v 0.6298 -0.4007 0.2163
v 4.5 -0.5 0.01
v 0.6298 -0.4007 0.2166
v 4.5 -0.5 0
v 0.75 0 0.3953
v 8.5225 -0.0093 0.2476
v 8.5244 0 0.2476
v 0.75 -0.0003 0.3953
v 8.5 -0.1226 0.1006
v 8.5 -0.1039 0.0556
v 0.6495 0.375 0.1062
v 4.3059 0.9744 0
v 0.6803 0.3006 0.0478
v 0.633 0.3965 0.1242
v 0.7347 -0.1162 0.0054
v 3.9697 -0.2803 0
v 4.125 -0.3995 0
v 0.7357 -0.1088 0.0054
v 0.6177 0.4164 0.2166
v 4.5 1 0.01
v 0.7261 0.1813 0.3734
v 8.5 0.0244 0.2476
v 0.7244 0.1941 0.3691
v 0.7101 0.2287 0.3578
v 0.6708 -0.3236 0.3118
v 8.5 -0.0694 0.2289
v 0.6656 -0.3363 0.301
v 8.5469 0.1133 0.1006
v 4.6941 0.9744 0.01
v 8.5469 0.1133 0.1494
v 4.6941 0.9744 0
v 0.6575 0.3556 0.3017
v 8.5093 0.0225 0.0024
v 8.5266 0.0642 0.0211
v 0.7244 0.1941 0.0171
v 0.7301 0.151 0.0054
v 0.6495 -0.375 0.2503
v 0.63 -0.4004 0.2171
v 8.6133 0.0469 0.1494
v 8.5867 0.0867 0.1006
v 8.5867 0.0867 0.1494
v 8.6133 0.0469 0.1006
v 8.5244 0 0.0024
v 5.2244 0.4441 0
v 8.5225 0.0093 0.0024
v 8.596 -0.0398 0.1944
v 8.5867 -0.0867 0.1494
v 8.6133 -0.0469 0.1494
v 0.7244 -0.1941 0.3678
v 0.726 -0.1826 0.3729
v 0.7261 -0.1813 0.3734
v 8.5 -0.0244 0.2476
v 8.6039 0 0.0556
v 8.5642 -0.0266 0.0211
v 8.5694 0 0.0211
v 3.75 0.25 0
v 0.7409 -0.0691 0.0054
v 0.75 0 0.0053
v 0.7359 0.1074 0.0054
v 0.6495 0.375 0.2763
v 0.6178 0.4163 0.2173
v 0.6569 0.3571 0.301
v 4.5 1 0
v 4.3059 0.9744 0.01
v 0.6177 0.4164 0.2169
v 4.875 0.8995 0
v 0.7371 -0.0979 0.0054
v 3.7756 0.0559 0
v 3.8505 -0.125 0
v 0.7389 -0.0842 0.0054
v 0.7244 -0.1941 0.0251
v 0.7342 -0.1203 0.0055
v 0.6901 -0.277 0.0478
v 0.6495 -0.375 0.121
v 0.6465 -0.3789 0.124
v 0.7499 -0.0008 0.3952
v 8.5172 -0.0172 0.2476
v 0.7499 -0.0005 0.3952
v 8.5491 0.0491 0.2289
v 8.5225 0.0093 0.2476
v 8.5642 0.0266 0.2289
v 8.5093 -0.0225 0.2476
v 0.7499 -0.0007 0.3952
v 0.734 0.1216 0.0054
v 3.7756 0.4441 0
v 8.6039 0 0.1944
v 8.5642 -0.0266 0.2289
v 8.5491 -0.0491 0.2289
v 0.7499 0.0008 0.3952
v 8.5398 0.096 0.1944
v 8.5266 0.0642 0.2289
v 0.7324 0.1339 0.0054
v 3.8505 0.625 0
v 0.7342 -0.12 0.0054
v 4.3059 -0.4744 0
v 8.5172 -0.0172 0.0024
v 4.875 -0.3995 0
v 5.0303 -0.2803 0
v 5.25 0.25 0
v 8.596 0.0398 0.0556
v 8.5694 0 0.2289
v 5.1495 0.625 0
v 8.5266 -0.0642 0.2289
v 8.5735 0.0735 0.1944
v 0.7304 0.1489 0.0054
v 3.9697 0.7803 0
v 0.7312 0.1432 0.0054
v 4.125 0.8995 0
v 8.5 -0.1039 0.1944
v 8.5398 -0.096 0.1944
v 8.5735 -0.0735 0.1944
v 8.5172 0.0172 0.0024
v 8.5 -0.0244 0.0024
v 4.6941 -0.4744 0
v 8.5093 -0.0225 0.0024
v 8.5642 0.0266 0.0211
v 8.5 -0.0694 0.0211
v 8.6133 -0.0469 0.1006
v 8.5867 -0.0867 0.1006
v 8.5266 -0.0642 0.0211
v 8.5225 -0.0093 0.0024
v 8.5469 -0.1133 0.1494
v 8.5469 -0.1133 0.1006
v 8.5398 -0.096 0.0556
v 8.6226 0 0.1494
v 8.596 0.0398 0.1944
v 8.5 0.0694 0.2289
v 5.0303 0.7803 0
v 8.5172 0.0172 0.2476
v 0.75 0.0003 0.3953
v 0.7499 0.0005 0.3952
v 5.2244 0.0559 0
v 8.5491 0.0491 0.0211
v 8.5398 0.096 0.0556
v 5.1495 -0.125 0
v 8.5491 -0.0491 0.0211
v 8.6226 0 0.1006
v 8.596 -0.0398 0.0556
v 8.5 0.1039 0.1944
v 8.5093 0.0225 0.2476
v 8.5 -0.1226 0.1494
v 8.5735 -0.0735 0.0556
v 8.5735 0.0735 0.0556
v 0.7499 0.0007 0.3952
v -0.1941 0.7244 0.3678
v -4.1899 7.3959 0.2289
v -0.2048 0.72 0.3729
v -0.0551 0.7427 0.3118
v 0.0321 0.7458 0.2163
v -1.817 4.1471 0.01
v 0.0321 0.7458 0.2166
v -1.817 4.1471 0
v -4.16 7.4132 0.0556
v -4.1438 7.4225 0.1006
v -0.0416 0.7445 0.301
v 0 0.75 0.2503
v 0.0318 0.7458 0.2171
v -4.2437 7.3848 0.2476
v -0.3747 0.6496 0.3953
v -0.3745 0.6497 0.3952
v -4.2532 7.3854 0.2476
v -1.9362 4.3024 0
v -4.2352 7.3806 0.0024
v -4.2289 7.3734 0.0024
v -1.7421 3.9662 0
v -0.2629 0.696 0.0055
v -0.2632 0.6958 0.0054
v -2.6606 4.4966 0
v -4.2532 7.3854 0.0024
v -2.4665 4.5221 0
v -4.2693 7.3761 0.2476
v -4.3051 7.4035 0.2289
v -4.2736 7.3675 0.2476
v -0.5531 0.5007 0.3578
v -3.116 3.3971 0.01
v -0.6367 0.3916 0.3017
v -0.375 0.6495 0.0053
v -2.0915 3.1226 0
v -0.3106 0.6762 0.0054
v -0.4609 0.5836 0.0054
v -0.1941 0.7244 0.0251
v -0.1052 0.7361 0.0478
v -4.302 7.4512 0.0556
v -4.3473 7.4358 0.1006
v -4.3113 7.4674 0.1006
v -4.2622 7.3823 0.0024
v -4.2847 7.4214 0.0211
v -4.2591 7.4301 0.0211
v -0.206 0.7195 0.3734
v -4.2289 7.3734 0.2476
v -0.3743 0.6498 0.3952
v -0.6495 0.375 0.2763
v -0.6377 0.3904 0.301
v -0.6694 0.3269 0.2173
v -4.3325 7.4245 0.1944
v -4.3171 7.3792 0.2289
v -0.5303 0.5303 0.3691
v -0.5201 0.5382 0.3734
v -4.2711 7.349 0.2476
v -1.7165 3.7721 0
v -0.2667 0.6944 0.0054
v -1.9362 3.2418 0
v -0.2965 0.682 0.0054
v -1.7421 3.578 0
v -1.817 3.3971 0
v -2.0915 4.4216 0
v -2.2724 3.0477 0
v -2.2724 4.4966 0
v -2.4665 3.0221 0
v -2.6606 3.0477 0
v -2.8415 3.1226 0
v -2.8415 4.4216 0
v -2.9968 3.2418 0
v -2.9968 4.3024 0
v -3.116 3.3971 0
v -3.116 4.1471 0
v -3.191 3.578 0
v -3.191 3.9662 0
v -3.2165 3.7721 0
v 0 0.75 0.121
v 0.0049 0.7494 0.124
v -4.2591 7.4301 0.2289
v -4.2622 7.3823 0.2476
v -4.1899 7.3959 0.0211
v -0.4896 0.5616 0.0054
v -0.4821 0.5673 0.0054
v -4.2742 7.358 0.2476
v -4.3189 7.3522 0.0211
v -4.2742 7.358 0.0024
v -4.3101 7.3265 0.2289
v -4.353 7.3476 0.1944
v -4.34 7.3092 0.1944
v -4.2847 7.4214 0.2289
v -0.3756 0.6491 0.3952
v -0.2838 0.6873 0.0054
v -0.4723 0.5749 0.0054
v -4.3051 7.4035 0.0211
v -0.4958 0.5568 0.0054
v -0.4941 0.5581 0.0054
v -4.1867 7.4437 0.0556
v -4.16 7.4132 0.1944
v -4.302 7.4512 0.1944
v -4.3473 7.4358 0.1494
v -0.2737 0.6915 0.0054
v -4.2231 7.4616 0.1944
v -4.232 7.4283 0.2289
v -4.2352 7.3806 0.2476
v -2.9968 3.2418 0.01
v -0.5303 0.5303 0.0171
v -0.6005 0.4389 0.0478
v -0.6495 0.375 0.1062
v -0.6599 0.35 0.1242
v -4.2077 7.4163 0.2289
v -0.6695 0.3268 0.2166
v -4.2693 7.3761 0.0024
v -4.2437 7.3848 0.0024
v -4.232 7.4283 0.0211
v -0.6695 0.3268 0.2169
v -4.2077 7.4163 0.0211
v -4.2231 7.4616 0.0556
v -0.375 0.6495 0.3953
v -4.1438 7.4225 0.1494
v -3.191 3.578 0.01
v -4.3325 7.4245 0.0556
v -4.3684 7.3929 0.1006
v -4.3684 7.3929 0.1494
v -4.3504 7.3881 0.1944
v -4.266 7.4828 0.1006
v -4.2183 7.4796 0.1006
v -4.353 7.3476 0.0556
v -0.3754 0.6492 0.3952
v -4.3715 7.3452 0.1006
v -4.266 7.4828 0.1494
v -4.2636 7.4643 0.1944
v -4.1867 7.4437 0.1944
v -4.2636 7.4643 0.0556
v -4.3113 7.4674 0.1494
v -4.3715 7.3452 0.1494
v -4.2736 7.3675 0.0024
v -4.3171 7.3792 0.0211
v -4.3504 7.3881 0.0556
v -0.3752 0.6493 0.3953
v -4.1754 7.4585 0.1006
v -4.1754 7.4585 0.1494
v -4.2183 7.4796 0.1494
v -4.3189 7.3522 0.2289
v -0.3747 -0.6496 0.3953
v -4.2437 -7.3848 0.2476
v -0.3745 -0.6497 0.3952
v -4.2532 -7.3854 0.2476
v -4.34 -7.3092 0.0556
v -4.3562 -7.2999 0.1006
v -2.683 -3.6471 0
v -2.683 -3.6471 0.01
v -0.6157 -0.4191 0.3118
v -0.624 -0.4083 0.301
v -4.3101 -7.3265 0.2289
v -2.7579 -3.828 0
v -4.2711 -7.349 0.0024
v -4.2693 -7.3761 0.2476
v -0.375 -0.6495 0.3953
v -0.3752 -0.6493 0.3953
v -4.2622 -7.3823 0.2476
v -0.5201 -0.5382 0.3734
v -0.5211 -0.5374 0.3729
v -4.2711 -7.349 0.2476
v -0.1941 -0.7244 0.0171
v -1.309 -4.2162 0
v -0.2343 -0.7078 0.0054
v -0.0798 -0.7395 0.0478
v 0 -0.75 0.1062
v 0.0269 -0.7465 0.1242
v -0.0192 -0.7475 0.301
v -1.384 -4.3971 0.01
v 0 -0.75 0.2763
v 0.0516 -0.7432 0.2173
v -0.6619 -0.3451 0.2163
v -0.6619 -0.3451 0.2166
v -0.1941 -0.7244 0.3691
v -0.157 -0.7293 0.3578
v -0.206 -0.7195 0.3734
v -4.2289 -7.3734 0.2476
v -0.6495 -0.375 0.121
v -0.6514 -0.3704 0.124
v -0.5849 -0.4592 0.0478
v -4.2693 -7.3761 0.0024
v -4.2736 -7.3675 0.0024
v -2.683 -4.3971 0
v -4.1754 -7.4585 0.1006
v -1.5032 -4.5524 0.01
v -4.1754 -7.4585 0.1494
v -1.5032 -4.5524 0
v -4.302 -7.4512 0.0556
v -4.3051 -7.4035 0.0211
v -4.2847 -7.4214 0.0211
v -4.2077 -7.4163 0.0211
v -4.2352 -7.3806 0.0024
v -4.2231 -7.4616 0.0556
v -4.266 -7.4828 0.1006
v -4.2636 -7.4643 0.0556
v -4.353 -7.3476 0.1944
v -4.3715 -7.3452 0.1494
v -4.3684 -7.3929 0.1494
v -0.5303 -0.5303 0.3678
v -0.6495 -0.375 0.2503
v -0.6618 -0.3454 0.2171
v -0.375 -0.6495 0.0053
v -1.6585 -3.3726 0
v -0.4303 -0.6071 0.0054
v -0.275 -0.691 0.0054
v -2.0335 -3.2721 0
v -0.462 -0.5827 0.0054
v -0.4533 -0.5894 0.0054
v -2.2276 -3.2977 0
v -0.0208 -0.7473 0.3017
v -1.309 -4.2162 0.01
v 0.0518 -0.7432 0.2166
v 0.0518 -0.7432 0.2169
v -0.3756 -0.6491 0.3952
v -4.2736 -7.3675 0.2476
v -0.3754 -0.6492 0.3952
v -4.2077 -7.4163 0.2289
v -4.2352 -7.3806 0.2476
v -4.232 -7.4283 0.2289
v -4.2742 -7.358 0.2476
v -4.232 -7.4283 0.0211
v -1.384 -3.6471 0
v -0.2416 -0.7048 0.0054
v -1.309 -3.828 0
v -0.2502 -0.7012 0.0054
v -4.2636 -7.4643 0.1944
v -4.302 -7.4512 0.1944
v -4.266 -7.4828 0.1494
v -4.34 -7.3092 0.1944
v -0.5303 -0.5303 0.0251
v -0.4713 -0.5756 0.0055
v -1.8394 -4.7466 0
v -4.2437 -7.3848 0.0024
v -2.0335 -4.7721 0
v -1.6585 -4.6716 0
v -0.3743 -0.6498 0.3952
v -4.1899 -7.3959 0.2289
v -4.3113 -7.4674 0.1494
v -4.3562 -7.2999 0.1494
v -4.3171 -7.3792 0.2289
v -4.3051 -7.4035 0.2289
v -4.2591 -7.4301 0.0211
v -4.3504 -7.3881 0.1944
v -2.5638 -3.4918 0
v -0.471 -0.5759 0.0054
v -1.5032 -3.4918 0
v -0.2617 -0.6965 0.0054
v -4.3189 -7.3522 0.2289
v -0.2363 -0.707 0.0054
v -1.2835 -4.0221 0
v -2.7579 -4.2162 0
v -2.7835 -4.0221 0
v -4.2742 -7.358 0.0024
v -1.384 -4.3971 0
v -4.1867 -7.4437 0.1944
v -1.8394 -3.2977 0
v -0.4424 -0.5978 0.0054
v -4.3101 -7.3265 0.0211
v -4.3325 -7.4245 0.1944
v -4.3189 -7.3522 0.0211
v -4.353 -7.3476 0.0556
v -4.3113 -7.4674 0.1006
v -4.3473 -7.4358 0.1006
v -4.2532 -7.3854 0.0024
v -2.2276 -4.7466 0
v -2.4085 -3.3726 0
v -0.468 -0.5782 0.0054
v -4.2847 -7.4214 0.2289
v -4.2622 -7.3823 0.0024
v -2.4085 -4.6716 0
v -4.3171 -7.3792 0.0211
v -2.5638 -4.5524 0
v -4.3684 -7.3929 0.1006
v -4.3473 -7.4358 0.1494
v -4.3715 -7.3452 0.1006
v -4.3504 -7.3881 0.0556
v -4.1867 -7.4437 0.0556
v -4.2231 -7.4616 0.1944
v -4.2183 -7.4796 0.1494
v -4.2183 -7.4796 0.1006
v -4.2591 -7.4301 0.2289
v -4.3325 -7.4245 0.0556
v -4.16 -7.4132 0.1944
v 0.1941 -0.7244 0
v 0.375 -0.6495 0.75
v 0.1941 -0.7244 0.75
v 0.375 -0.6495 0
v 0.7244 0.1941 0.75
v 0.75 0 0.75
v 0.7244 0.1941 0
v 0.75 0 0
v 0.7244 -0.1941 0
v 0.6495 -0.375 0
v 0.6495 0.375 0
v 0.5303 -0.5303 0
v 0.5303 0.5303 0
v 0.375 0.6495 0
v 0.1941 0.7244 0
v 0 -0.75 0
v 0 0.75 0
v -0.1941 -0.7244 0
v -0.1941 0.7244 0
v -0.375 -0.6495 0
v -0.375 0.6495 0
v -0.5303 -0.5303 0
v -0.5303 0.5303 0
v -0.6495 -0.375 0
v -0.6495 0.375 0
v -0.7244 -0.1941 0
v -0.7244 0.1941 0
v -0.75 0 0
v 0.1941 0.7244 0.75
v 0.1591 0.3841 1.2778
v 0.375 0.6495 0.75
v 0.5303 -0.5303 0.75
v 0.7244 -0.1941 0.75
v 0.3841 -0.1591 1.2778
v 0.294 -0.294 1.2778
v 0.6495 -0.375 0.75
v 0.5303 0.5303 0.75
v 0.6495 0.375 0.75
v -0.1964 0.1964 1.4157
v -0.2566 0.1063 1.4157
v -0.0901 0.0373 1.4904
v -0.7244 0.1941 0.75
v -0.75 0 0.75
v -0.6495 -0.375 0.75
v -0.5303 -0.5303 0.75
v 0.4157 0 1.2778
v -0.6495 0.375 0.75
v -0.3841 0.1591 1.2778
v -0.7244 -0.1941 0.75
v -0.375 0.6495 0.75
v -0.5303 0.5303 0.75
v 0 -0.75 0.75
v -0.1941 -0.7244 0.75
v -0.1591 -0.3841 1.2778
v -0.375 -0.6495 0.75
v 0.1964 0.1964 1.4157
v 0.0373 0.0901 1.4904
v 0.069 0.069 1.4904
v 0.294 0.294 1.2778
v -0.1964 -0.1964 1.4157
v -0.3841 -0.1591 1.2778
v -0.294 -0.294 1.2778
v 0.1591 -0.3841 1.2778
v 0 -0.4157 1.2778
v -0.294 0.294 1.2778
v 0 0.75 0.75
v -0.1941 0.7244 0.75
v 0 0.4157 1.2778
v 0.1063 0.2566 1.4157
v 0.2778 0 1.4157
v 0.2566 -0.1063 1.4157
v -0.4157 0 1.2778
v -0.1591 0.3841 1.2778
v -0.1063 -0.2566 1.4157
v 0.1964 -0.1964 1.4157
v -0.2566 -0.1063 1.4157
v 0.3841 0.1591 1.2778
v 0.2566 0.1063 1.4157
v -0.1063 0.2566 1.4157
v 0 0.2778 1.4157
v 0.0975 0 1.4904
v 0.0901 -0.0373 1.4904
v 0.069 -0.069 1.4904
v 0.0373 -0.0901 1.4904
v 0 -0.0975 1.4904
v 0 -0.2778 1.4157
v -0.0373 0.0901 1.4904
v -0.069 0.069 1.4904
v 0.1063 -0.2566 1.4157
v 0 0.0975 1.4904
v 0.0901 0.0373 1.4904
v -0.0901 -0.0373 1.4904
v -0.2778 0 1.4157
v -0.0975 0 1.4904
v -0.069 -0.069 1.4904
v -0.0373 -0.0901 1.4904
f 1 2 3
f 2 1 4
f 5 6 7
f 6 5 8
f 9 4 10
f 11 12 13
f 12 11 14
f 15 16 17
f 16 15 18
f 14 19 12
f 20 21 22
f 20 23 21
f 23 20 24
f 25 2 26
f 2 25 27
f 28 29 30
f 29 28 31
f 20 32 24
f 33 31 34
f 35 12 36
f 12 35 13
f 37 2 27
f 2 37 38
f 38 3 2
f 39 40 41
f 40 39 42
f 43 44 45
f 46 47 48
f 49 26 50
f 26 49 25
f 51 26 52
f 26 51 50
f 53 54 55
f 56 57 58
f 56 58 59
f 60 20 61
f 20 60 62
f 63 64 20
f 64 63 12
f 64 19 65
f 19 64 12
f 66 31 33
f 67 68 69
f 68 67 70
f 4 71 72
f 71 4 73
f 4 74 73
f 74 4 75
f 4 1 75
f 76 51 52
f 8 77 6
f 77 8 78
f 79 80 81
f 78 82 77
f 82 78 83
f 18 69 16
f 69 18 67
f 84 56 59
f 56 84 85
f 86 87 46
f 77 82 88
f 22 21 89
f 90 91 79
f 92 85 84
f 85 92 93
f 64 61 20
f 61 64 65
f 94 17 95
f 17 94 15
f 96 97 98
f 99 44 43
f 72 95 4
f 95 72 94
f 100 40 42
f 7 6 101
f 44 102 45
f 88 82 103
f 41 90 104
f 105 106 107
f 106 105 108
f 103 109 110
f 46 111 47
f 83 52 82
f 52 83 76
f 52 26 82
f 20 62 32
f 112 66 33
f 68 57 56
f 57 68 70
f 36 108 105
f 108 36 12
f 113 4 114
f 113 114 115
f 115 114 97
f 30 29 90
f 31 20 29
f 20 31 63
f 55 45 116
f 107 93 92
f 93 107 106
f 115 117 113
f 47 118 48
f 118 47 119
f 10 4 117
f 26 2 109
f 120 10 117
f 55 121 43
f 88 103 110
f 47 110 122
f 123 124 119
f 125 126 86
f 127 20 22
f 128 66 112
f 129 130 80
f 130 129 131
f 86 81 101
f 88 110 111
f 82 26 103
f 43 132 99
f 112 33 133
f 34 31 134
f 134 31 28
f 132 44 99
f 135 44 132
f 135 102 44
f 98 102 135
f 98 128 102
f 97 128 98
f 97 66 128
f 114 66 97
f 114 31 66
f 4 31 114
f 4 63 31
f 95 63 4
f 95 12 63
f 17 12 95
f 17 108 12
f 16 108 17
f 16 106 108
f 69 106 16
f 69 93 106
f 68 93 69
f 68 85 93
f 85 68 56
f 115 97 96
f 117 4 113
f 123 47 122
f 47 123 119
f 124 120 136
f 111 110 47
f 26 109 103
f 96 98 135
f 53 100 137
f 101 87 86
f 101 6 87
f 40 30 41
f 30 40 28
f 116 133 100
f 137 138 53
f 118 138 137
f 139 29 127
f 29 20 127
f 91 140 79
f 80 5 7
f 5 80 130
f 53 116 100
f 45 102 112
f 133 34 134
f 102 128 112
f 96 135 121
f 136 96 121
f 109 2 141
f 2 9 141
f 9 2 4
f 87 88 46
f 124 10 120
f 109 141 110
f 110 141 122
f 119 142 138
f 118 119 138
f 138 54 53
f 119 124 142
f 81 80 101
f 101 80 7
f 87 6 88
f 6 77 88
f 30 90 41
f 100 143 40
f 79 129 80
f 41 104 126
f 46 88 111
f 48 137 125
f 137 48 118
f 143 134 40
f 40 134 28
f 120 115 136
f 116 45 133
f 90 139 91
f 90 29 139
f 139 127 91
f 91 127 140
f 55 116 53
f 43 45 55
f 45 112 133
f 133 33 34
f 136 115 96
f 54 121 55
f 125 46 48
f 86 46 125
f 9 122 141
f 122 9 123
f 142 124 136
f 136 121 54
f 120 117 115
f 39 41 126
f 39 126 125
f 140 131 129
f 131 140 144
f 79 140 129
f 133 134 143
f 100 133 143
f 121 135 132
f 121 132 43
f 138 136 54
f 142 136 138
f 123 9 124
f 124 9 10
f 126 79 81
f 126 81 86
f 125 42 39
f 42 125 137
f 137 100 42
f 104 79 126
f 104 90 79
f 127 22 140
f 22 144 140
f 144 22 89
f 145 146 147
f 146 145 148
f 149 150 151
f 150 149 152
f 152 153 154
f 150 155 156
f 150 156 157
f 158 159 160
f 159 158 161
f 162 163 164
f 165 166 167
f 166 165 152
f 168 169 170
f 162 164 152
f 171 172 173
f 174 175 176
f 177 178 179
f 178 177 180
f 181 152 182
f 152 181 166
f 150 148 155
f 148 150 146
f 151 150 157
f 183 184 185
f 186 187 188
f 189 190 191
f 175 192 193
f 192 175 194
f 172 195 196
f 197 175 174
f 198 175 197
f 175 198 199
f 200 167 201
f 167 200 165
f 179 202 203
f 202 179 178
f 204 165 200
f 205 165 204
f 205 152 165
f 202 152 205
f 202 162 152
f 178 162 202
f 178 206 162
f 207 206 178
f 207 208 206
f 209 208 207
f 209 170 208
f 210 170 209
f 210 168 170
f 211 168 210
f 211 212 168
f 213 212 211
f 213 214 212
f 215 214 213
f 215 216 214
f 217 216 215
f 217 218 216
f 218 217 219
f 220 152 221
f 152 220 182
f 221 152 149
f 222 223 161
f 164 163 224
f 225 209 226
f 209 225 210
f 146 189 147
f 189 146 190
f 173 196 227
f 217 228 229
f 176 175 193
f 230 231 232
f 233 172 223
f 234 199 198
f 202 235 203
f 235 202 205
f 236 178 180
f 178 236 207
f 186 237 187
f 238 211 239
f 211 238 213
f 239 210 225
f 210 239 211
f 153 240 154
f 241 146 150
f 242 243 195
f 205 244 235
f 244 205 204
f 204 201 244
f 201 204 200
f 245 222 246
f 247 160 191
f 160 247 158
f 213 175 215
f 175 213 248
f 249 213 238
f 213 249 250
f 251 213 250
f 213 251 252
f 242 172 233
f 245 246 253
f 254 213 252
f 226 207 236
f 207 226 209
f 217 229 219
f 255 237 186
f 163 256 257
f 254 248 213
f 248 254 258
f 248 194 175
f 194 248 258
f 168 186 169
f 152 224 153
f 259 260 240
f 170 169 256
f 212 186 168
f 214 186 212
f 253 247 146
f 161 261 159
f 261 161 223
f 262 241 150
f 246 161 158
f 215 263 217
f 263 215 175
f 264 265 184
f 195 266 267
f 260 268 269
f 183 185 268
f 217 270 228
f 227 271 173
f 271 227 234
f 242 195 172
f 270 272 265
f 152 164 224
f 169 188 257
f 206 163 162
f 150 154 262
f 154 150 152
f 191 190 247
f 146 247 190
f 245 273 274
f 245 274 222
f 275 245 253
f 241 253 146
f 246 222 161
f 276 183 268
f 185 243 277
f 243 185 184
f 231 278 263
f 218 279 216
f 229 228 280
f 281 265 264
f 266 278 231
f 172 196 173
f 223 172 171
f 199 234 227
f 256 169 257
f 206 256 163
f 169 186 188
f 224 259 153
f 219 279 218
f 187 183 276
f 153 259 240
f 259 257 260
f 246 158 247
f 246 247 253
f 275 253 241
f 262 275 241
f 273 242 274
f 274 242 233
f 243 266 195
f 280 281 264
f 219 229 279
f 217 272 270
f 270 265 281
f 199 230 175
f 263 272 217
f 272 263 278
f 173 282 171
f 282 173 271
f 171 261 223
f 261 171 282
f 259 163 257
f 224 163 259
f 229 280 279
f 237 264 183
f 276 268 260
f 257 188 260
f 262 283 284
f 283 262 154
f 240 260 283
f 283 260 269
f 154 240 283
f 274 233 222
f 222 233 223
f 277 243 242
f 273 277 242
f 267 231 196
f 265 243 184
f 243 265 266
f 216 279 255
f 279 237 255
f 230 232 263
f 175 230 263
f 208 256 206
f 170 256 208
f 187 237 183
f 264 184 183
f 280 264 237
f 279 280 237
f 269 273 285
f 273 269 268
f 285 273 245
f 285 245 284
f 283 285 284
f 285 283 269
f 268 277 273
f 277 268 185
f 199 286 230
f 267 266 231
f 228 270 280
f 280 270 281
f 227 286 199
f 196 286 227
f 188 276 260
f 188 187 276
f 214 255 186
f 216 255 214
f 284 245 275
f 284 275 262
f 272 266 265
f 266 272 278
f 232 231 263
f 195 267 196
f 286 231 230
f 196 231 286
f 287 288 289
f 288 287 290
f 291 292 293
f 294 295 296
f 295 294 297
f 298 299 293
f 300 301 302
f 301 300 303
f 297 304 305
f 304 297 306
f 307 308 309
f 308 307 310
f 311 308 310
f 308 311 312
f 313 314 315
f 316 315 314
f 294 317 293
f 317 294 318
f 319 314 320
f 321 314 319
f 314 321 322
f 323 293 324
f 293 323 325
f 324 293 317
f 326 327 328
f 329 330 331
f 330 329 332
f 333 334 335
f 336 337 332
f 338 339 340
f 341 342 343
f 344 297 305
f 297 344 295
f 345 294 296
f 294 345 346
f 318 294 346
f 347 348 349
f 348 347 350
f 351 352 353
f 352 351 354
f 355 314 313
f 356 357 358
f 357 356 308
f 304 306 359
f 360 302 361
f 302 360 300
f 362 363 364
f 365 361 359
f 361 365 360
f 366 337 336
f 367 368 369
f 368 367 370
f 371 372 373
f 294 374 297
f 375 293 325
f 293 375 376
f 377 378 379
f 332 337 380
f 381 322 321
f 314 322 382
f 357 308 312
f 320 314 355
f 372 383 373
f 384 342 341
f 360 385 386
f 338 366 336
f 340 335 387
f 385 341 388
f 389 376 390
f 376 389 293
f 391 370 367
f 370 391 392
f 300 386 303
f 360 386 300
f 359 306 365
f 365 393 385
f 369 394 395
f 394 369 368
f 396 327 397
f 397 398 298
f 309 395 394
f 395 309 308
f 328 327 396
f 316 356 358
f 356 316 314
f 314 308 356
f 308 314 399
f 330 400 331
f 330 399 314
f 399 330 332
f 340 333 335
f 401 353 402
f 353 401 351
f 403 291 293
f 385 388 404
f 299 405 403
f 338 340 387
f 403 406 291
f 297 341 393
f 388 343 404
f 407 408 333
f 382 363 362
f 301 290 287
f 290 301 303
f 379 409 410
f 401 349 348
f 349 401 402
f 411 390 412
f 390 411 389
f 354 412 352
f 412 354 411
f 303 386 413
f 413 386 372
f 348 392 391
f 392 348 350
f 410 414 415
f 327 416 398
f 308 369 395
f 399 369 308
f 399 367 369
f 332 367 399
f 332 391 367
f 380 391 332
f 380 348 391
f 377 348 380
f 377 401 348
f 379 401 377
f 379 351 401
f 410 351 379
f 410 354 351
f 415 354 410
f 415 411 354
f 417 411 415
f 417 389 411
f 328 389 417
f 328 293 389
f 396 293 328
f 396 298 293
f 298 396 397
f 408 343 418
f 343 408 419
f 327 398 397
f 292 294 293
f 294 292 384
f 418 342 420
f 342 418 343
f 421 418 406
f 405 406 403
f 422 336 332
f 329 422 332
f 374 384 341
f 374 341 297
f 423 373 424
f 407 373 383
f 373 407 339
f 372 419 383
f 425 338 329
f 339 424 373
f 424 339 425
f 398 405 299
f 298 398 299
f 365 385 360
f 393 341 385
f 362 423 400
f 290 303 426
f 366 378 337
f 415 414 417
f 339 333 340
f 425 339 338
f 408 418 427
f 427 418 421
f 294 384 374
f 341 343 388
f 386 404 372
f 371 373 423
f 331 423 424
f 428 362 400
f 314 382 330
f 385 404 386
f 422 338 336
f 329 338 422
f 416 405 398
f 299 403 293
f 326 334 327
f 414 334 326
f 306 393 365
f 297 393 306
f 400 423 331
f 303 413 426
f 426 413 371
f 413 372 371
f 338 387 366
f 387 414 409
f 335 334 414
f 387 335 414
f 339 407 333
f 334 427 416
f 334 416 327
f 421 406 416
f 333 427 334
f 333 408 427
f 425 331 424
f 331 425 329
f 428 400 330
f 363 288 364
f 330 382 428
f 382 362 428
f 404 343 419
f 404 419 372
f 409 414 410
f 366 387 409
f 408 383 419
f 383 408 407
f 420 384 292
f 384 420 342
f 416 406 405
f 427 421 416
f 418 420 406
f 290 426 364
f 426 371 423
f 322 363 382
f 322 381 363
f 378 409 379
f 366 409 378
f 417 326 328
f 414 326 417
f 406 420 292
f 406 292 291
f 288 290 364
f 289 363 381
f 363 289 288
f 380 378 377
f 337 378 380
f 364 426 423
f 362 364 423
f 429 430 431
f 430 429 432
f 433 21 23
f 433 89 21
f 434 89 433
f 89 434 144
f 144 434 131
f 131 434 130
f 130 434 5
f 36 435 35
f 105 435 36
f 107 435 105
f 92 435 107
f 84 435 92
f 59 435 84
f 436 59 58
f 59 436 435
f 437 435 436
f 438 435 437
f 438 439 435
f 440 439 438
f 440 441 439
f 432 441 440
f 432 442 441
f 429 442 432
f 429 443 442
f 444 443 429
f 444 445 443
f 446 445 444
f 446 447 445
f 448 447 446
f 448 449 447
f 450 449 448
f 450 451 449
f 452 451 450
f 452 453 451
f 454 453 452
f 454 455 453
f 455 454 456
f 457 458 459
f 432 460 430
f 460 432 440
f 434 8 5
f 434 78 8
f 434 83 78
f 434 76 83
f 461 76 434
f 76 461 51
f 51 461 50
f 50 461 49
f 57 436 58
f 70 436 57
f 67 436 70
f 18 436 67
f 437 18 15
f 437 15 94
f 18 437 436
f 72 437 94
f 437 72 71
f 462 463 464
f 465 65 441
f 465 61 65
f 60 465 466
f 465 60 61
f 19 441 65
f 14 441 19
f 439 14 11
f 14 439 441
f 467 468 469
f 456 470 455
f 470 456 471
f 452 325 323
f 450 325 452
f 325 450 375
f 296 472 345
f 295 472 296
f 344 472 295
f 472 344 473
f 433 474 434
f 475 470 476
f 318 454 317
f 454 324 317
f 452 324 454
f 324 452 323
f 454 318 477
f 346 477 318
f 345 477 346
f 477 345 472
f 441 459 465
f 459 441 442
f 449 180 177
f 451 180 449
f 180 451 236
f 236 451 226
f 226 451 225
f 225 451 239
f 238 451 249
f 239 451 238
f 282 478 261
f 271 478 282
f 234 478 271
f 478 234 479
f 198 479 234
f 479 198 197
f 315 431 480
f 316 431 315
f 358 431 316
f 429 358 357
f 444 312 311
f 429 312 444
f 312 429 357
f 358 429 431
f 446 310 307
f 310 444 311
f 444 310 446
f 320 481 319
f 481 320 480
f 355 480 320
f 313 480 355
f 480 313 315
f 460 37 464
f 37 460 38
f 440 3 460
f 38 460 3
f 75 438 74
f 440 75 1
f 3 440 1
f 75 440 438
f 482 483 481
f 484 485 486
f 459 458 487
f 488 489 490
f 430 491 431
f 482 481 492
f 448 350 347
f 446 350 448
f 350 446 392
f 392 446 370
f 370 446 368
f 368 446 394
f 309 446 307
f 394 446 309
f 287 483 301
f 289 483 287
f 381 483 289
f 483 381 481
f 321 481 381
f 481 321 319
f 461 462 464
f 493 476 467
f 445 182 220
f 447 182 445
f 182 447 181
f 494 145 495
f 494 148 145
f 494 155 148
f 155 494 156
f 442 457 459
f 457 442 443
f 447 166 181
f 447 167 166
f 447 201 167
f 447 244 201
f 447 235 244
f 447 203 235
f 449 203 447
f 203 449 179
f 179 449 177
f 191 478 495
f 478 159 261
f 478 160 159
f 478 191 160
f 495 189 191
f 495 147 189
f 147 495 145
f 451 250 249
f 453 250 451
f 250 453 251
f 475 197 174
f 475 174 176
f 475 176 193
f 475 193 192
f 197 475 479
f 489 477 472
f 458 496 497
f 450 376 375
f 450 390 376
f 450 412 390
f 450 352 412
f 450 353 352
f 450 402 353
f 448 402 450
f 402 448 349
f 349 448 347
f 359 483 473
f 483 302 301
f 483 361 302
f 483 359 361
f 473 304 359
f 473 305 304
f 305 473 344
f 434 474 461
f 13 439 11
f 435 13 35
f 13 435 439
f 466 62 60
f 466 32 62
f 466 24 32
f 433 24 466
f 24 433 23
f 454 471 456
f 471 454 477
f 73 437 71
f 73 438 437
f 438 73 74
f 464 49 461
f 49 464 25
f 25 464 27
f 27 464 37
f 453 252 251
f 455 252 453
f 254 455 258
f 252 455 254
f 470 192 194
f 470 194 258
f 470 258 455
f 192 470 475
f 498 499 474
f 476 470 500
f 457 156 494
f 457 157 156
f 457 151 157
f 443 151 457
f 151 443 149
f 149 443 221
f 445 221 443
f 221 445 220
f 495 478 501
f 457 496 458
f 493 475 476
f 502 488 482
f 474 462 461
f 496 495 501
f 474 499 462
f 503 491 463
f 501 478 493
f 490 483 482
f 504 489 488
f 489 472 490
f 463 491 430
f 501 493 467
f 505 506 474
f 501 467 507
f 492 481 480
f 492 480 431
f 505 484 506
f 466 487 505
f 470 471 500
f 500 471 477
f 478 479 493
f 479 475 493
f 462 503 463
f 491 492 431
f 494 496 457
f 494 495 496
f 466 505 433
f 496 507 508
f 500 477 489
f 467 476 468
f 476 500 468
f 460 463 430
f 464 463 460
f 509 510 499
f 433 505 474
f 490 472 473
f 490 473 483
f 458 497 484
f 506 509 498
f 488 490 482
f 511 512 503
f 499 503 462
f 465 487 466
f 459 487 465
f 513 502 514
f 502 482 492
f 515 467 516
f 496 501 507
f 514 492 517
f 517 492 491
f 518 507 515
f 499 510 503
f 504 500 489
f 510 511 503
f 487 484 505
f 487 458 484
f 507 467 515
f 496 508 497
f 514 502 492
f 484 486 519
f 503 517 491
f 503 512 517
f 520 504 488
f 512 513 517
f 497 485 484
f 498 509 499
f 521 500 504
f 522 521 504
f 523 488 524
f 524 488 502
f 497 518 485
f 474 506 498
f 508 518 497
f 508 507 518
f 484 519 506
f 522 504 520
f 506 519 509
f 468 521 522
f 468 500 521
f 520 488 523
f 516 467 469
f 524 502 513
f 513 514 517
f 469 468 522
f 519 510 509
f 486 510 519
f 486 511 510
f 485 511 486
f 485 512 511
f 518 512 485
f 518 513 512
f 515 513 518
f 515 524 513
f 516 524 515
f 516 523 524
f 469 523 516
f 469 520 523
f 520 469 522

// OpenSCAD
eps=0.01;
$fs=0.2;

module wing() {
	hull() {
      // closest to base
		scale([1,1,.5]) rotate([0,-90,0]) translate([.4,0])
	      cylinder(r=0.4,h=eps);
      // middle of wing
		translate([4,.25]) cylinder(r=.75,h=eps);
      //  tip of wing
		translate([8,0,1/8]) sphere(1/8, $fn=16);
	}
}

module wings() {
	for (i = [0:2]) {
	  rotate([0,0,i * 360/3]) translate([.5,0]) wing();
	}
	
	hull() {
	  cylinder(r=.75, h=.75);
	  translate([0,0,1]) sphere(r=.5);
	}
}

wings();
